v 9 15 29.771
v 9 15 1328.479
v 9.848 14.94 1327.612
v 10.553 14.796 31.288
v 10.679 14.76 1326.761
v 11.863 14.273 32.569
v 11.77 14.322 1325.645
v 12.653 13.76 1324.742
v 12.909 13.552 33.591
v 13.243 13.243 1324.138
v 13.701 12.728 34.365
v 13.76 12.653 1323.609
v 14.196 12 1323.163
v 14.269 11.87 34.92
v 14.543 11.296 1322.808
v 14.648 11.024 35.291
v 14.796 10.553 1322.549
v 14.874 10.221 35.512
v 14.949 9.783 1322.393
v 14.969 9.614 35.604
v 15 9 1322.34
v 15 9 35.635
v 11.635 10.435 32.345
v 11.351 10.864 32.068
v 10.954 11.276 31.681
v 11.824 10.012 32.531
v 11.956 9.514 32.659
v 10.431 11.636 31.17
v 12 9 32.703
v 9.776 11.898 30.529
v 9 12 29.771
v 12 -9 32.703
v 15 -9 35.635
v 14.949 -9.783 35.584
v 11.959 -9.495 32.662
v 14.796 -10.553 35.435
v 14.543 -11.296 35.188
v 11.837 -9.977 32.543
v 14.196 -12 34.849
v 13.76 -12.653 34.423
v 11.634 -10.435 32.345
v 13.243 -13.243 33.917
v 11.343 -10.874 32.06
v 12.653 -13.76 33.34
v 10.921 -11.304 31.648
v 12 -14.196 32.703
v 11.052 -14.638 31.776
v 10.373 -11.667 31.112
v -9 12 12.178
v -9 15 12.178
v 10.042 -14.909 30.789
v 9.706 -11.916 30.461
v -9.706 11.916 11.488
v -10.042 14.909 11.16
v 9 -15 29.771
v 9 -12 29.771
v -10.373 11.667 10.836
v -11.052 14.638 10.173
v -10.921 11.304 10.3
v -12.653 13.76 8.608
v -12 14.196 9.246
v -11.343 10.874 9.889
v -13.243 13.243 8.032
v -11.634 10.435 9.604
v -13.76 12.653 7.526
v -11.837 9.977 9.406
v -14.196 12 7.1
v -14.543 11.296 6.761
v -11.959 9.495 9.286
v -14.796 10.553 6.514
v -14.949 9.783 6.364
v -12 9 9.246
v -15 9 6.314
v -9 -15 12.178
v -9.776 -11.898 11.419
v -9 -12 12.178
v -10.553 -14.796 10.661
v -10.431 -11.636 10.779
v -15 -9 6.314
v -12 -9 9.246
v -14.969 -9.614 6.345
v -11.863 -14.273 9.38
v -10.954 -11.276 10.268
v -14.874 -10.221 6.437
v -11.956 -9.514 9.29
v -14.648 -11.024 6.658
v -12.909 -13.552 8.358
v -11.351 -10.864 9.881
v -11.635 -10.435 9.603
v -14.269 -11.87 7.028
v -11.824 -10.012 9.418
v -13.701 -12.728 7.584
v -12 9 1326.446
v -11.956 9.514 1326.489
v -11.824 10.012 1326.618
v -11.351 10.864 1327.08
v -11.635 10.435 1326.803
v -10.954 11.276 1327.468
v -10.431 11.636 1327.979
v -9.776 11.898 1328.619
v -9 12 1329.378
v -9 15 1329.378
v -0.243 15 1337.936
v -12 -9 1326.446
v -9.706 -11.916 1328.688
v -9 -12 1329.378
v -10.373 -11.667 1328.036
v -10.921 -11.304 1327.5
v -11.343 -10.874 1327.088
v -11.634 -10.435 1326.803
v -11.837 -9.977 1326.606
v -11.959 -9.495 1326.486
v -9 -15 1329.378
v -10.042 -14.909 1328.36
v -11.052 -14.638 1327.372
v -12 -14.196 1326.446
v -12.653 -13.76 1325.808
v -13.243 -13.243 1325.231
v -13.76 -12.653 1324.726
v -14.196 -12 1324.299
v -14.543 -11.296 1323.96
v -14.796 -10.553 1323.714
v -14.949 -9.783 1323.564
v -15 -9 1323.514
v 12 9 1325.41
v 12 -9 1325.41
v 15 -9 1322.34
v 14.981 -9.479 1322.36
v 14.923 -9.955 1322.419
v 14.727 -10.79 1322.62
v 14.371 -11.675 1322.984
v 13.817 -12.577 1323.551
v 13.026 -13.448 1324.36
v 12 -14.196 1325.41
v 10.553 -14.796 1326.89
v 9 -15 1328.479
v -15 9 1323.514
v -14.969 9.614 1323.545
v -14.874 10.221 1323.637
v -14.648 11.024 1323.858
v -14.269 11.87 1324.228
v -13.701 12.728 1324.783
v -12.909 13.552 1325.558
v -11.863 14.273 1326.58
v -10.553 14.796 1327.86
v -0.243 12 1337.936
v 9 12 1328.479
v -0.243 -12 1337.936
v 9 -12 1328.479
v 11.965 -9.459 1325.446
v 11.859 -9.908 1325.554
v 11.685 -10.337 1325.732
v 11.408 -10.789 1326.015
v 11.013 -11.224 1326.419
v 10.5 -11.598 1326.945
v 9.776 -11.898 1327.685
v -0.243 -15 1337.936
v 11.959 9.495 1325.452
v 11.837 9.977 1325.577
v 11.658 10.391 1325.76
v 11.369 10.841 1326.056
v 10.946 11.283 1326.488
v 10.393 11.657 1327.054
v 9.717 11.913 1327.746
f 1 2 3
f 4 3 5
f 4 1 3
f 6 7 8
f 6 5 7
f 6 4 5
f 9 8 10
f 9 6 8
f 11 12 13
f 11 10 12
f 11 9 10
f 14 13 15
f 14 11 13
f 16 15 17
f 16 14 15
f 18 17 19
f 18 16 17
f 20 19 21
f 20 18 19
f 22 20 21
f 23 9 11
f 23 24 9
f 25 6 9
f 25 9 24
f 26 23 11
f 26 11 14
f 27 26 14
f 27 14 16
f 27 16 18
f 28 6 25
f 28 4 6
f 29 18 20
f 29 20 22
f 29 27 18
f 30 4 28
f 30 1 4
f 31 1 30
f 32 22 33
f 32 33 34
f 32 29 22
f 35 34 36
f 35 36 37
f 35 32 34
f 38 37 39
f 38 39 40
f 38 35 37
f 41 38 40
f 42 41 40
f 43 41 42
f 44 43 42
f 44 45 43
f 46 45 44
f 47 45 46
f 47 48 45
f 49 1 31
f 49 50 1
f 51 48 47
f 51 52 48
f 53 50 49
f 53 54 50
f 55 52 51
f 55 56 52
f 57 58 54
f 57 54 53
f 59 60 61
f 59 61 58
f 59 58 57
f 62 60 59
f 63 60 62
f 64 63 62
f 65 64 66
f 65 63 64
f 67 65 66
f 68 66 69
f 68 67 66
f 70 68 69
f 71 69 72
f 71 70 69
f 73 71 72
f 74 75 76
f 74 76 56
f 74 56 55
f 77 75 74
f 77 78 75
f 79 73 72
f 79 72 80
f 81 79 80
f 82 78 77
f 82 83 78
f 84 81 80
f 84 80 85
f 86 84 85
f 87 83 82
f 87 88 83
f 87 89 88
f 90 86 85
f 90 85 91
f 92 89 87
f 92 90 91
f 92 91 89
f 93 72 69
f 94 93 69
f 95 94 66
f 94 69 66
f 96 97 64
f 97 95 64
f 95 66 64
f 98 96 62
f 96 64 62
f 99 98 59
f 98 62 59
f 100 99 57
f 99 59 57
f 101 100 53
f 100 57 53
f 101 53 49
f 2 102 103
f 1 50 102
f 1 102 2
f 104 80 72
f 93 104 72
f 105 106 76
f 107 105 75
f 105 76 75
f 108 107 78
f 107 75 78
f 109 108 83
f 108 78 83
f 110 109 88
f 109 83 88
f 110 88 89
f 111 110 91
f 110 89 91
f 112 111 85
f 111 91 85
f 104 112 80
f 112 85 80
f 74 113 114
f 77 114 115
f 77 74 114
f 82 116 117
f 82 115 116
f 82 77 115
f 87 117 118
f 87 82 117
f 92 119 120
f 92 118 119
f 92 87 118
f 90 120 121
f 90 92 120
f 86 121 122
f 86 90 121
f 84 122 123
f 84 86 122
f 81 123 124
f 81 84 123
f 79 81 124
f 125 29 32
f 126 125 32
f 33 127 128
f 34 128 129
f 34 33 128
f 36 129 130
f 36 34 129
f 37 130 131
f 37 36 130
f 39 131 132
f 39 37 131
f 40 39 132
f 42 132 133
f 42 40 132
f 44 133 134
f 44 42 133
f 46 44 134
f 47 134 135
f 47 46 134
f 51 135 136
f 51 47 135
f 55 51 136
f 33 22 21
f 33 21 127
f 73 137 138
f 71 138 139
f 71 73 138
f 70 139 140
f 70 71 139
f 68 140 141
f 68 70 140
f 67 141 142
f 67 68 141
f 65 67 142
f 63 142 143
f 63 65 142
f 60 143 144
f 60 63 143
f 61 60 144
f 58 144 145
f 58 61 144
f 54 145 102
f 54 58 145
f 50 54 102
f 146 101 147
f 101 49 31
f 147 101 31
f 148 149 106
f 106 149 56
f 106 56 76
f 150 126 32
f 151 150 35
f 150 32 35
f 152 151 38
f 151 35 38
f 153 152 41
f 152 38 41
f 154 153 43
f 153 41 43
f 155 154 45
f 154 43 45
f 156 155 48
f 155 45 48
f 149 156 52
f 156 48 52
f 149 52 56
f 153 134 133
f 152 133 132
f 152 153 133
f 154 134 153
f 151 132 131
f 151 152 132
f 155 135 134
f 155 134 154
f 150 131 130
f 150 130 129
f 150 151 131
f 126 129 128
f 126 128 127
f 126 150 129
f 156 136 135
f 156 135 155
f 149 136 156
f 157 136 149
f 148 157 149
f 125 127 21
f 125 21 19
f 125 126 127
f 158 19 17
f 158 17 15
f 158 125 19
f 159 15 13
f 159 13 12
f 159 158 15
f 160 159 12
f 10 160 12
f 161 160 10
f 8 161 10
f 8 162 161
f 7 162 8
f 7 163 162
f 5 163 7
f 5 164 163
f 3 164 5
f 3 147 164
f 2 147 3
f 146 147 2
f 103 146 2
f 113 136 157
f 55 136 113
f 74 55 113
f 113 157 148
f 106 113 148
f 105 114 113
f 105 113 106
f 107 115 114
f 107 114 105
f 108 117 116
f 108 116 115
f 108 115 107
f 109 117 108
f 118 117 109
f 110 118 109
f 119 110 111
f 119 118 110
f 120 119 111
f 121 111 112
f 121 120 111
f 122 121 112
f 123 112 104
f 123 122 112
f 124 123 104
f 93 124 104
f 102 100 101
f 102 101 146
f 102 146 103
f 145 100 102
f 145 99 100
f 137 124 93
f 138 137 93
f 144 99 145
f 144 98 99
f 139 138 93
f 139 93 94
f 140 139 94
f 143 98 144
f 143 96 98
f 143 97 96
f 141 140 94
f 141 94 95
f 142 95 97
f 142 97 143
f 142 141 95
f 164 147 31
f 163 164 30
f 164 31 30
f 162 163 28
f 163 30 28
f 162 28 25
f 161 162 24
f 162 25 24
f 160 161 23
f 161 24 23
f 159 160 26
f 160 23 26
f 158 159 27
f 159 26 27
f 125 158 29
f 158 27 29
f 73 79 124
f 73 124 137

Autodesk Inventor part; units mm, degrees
ref_plane "Start Plane" through (0, 0, 6.314) normal (0, 0, 1) x (1, 0, 0)
ref_plane "End Plane" through (0, 0, 1337.9364) normal (0, 0, 1) x (1, 0, 0)
sketch "Sketch" plane through (0, 0, 0) normal (0, 0, 1) x (1, 0, 0)
  line L0 (-15, -9) -> (-15, 9)
  line L1 (-9, 15) -> (9, 15)
  line L2 (15, 9) -> (15, -9)
  line L3 (9, -15) -> (-9, -15)
  arc A0 (-15, -9) -> (-9, -15) centre (-9, -9) ccw
  arc A1 (-9, 15) -> (-15, 9) centre (-9, 9) ccw
  arc A2 (15, 9) -> (9, 15) centre (9, 9) ccw
  arc A3 (9, -15) -> (15, -9) centre (9, -9) ccw
  arc A4 (-9, 12) -> (-12, 9) centre (-9, 9) ccw
  line L4 (-9, 12) -> (9, 12)
  arc A5 (12, 9) -> (9, 12) centre (9, 9) ccw
  line L5 (12, 9) -> (12, -9)
  arc A6 (9, -12) -> (12, -9) centre (9, -9) ccw
  line L6 (9, -12) -> (-9, -12)
  arc A7 (-12, -9) -> (-9, -12) centre (-9, -9) ccw
  line L7 (-12, -9) -> (-12, 9)
  line L8 (0, 22.7397) -> (0, -22.7397) construction
  line L9 (-22.7397, 0) -> (22.7397, 0) construction
  dimension "d7" = 6
  dimension "d10" = 30
  dimension "d11" = 30
  dimension "d12" = 3
  dimension "d15" = 15
  dimension "d16" = 15
extrude "Body" add sketch "Sketch" along normal up to surface (1331.6224 mm away) from surface at 6.314
sketch "Sketch3" plane through (0, 0, 0) normal (0, 0, 1) x (1, 0, 0)
  line L0 (0, 0) -> (10, 0)
ref_plane "Work Plane3" through (0, 0, 0) normal (0, -1, 0) x (1, 0, 0)
ref_plane "Work Plane4" through (-4.0481, -350, 17.018) normal (0.699, 0, -0.7152) x (-0.7152, 0, -0.699)
split "Split1" plane through (-4.0481, -350, 17.018) removes the side toward (0.699, 0, -0.7152)
ref_plane "Work Plane5" through (10.4845, -9, 1348.421) normal (-0.699, 0, 0.7152) x (0.7152, 0, 0.699)
split "Split2" plane through (10.4845, -9, 1348.421) removes the side toward (-0.699, 0, 0.7152)
ref_plane "Work Plane6" through (-10.7273, 9, 1348.6638) normal (0.7152, 0, 0.699) x (0.699, 0, -0.7152)
split "Split3" plane through (-10.7273, 9, 1348.6638) removes the side toward (0.7152, 0, 0.699)
sketch "Sketch4" plane through (0, 0, 0) normal (0, -1, 0) x (1, 0, 0)
  line L0 (-2, 6.314) -> (12, 6.314) projected
  line L1 (-2, 1337.9364) -> (12, 1337.9364) projected
  dimension "d18" = 1331.6224
equation "\"d7\" = G_IR"
equation "\"d10\" = G_H"
equation "\"d11\" = G_W"
equation "\"d12\" = G_T"
equation "\"d15\" = 0.5 * d10"
equation "\"d16\" = 0.5 * d11"
equation "\"d3\" = G_L"
equation "\"G_W\" = 30"
equation "\"G_H\" = 30"
equation "\"G_T\" = 3"
equation "\"G_IR\" = 6"
equation "\"G_L\" = d18"
equation "\"G_OFFSET_START\" = -6.31402"
equation "\"G_OFFSET_END\" = -21.21181"
equation "\"d13\" = -G_OFFSET_START"
equation "\"d14\" = G_OFFSET_END + B_L"
equation "\"B_L\" = 1359.14826"
properties part number "DIN EN 10219-2 - 30 x 30 x 3  - 1331.62" material "Steel, Mild"
